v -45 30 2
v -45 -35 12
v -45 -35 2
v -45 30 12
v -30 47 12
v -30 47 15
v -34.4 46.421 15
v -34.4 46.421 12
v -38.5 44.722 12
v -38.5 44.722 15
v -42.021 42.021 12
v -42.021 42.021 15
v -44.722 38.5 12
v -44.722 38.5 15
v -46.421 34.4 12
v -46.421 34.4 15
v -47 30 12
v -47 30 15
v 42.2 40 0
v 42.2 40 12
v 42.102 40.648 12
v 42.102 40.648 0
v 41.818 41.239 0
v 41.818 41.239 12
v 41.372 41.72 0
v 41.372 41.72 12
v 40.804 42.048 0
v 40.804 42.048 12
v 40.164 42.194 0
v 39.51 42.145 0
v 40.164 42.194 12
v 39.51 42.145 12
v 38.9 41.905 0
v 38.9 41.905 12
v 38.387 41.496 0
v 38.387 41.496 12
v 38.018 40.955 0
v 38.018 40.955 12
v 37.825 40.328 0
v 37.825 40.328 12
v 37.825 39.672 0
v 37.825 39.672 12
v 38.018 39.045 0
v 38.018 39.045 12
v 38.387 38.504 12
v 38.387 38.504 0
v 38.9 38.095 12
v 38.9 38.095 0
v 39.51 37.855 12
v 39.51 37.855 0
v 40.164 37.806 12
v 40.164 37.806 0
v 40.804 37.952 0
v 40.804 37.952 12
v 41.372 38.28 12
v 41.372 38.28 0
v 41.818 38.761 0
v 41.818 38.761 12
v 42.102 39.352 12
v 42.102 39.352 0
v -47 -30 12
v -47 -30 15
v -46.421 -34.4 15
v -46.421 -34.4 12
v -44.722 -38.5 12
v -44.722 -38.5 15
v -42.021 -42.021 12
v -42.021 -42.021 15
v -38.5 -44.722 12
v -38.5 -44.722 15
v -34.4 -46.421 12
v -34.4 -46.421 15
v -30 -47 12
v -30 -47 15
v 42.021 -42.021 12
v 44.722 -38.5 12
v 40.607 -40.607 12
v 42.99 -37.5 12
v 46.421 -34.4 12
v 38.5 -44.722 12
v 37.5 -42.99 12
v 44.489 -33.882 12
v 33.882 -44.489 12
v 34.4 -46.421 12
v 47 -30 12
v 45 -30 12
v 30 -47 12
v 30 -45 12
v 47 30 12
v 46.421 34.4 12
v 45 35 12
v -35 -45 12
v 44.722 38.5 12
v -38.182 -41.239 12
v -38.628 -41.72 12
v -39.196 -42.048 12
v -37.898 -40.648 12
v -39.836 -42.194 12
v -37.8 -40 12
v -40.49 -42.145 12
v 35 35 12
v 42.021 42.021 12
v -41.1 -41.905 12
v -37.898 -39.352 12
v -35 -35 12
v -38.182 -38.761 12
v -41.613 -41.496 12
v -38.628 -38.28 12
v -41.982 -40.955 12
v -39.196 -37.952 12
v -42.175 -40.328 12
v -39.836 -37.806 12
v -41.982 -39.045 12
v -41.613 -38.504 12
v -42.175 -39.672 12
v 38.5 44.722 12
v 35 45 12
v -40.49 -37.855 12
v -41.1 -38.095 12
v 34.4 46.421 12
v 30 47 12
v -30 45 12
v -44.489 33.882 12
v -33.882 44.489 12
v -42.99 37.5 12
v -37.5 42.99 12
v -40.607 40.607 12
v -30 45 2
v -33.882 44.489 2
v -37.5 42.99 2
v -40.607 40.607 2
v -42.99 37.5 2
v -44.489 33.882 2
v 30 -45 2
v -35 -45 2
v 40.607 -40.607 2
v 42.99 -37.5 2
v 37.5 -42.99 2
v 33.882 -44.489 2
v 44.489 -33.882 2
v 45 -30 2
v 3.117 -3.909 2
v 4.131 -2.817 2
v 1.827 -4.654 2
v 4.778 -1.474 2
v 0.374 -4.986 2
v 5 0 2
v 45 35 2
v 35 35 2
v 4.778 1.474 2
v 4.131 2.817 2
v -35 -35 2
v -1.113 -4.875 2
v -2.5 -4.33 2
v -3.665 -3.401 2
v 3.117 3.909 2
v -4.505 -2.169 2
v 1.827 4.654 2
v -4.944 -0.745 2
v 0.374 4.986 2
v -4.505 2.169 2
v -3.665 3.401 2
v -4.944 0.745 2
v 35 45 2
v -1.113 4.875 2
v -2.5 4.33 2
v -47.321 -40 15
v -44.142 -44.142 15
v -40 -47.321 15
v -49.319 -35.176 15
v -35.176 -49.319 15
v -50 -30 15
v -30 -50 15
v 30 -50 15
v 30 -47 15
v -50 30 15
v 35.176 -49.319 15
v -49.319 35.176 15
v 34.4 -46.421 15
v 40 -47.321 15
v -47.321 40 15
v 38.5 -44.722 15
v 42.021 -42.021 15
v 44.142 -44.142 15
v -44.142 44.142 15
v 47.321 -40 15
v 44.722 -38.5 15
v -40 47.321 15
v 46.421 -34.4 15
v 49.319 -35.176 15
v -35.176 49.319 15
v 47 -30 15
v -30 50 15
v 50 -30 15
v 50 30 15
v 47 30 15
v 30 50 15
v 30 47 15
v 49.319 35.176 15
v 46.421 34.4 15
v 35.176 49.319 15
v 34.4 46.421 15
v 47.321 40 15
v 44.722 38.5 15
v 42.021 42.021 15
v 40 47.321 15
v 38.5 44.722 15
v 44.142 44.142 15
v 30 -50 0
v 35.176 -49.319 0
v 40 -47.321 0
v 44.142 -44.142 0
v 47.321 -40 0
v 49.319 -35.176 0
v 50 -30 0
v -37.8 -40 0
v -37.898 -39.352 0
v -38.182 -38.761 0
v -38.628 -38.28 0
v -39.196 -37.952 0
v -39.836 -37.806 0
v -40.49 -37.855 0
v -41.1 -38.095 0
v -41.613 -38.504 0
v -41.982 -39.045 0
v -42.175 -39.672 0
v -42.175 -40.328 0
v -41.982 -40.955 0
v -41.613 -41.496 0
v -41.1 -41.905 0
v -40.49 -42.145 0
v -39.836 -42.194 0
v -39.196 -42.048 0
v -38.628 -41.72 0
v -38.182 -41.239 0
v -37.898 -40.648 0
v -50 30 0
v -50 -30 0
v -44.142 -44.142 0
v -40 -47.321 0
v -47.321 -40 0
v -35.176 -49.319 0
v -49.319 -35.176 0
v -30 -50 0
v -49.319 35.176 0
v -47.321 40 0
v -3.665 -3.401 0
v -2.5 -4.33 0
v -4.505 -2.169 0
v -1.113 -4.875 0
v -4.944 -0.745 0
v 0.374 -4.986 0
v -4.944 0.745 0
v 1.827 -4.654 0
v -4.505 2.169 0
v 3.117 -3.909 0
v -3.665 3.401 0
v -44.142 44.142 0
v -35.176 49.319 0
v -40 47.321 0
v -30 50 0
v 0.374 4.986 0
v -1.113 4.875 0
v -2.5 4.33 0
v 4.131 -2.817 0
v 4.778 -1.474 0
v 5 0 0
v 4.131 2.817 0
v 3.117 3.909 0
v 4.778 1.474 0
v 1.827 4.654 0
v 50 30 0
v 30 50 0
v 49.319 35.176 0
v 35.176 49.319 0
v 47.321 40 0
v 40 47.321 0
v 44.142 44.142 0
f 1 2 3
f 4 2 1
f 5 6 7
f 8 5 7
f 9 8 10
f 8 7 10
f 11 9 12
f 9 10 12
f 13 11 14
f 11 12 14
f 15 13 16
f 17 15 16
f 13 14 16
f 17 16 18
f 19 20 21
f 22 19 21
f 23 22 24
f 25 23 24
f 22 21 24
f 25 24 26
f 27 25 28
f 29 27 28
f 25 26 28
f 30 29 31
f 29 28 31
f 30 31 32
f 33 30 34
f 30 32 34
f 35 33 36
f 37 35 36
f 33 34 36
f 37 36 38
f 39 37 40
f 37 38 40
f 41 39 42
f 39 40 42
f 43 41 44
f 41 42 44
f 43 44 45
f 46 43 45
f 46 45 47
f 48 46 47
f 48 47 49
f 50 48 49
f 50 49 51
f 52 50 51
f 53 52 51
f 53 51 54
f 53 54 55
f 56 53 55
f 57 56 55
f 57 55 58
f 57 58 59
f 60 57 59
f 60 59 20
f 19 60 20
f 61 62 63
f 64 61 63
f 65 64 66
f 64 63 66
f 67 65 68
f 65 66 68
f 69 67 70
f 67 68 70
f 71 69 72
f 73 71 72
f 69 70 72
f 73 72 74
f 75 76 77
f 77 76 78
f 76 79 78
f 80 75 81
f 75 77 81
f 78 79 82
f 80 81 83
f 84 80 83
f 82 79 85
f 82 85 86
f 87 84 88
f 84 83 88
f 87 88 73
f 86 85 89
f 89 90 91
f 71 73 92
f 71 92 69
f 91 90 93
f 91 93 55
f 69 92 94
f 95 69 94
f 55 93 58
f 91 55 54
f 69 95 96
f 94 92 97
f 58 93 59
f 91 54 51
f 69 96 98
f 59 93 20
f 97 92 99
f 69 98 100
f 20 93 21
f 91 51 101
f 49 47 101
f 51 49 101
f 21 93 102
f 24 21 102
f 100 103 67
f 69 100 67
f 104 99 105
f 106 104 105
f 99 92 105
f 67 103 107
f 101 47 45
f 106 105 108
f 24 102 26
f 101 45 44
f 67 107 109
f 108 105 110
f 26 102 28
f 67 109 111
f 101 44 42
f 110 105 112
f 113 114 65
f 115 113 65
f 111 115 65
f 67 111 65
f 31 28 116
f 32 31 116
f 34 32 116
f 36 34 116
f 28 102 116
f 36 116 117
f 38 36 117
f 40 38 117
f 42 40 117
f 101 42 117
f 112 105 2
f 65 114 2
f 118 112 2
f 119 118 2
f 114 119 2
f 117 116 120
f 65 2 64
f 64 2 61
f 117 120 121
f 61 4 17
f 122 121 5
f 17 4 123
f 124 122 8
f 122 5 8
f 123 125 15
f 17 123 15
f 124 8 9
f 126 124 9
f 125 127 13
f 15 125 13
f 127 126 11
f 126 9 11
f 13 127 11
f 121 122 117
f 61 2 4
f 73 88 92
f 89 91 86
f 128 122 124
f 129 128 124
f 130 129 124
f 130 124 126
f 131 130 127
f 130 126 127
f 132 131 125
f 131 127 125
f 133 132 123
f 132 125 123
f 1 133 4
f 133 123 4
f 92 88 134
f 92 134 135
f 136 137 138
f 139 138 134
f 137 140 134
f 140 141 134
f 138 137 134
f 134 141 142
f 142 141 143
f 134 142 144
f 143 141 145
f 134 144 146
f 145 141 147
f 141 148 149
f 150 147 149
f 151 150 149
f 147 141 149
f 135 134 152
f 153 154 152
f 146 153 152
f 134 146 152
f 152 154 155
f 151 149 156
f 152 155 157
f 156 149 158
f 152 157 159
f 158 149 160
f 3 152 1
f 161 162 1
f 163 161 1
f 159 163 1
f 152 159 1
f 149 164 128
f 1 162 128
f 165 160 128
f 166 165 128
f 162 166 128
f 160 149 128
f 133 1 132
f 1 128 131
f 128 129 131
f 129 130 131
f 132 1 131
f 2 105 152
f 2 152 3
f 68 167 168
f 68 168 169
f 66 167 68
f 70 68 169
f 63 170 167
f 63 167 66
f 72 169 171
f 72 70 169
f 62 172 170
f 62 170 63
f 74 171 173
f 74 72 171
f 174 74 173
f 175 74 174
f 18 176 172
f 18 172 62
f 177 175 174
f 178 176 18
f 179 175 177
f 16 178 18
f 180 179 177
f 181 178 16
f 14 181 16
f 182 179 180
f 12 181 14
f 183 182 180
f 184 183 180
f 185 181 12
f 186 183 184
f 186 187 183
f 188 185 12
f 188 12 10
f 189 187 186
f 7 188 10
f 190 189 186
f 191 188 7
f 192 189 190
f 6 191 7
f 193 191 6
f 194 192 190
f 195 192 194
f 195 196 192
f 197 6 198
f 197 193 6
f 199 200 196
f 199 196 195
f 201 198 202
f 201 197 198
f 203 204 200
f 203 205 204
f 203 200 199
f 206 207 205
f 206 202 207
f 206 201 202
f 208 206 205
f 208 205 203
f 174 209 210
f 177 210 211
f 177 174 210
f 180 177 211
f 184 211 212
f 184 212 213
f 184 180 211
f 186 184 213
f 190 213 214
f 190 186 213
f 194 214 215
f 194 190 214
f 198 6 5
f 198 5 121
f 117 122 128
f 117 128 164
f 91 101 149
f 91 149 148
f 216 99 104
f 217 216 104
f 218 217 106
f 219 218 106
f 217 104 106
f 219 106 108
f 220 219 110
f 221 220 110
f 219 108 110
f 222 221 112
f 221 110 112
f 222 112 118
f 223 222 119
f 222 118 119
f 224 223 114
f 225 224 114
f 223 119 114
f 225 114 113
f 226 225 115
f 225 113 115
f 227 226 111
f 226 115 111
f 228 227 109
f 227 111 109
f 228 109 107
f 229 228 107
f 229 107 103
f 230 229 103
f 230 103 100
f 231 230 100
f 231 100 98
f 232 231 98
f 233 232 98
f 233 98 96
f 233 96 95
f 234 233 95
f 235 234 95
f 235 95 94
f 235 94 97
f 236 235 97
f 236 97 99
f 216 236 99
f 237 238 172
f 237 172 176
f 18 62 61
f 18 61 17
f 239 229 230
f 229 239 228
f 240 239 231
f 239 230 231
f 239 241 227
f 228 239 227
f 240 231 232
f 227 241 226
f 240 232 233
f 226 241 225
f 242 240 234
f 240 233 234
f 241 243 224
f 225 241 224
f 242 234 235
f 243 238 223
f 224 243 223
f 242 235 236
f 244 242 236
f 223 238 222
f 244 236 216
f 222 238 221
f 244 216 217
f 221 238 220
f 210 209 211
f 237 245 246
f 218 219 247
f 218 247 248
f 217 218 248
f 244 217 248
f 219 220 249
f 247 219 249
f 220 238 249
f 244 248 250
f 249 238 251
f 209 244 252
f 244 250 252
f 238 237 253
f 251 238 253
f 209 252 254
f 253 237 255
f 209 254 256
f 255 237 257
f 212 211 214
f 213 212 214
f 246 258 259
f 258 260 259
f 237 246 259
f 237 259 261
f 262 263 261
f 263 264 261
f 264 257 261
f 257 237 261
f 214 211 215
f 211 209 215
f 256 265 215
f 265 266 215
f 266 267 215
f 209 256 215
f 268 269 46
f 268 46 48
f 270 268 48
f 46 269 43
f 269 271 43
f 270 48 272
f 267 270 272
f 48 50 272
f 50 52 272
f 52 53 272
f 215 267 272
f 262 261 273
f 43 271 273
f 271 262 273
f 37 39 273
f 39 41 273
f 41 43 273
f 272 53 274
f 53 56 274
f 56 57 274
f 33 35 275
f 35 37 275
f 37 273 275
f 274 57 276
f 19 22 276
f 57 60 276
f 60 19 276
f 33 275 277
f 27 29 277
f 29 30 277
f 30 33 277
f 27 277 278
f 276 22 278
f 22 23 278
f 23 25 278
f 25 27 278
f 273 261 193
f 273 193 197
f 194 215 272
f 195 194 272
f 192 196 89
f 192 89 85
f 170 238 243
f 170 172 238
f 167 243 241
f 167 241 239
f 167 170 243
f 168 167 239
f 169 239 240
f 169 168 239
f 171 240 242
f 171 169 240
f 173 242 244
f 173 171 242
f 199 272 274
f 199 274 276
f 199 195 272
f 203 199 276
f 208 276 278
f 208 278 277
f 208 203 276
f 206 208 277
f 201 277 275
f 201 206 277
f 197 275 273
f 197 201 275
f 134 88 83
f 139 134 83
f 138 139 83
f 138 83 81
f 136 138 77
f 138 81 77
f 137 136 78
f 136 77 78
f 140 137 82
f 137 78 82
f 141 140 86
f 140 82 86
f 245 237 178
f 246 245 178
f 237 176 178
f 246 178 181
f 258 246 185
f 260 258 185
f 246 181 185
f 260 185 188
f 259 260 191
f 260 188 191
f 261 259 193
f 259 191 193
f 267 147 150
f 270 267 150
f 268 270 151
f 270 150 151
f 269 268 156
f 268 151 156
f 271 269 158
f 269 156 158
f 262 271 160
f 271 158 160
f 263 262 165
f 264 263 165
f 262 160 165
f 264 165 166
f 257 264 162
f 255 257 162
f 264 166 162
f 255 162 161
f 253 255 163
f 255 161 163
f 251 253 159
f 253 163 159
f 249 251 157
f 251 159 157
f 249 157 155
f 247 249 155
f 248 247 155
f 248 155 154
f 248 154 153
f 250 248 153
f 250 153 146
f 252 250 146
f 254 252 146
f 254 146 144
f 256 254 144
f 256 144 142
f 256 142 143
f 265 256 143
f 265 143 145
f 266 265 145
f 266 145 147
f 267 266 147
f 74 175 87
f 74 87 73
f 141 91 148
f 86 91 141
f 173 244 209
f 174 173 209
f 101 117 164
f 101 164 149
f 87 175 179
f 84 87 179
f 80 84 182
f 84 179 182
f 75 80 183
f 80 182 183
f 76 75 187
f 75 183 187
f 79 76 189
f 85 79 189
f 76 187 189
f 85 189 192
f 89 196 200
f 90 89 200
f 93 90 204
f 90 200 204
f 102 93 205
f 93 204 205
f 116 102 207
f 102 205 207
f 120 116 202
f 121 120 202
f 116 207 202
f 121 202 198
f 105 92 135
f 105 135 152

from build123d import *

# Parameters (mm, degrees)
SKETCH_W        = 100
SKETCH_H        = 100
PAD_DEPTH       = 15
FILLET_R        = 20
POCKET_DEPTH    = 3
POCKET001_DEPTH = 10
SKETCH003_R     = 2.2
POCKET002_DEPTH = 12.001
SKETCH004_R     = 5
POCKET003_DEPTH = 2.001


with BuildPart() as part:
    # Sketch → Pad (new body)
    with BuildSketch(Plane.XY):
        Rectangle(SKETCH_W, SKETCH_H)
    extrude(amount=PAD_DEPTH)

    # Fillet
    fillet_edges = [part.edges().sort_by_distance(p)[0] for p in [
        (-50, 50, 7.5),
        (50, 50, 7.5),
        (50, -50, 7.5),
        (-50, -50, 7.5),
    ]]
    fillet(fillet_edges, radius=FILLET_R)

    # Sketch001 (on Face5 of Fillet) → Pocket (cut)
    with BuildSketch(Plane.XY.offset(15)):
        with BuildLine():
            Line((-30, 47), (30, 47))
            ThreePointArc((47, 30), (42.020815, 42.020815), (30, 47))
            Line((47, 30), (47, -30))
            ThreePointArc((30, -47), (42.020815, -42.020815), (47, -30))
            Line((30, -47), (-30, -47))
            ThreePointArc((-47, -30), (-42.020815, -42.020815), (-30, -47))
            Line((-47, -30), (-47, 30))
            ThreePointArc((-30, 47), (-42.020815, 42.020815), (-47, 30))
        make_face()
    extrude(amount=-POCKET_DEPTH, mode=Mode.SUBTRACT)

    # Sketch002 (on Face19 of Pocket) → Pocket001 (cut)
    with BuildSketch(Plane.XY.offset(12)):
        with BuildLine():
            Line((35, 44.99997), (35, 34.99997))
            Line((35, 34.99997), (45, 34.99997))
            Line((45, 34.99997), (45, -29.99997))
            ThreePointArc((30, -44.99997), (40.606602, -40.606572), (45, -29.99997))
            Line((30, -44.99997), (-35, -44.99997))
            Line((-35, -44.99997), (-35, -34.99997))
            Line((-35, -34.99997), (-45, -34.99997))
            Line((-45, -34.99997), (-45, 29.99997))
            ThreePointArc((-30, 44.99997), (-40.606602, 40.606572), (-45, 29.99997))
            Line((-30, 44.99997), (35, 44.99997))
        make_face()
    extrude(amount=-POCKET001_DEPTH, mode=Mode.SUBTRACT)

    # Sketch003 (on Face19 of Pocket001) → Pocket002 (cut, through all)
    with BuildSketch(Plane.XY.offset(12)):
        with Locations((-40, -40)):
            Circle(SKETCH003_R)
        with Locations((40, 40)):
            Circle(SKETCH003_R)
    extrude(amount=-POCKET002_DEPTH, mode=Mode.SUBTRACT)

    # Sketch004 (on Face32 of Pocket002) → Pocket003 (cut, through all)
    with BuildSketch(Plane.XY.offset(2)):
        Circle(SKETCH004_R)
    extrude(amount=-POCKET003_DEPTH, mode=Mode.SUBTRACT)


solid = part.part
